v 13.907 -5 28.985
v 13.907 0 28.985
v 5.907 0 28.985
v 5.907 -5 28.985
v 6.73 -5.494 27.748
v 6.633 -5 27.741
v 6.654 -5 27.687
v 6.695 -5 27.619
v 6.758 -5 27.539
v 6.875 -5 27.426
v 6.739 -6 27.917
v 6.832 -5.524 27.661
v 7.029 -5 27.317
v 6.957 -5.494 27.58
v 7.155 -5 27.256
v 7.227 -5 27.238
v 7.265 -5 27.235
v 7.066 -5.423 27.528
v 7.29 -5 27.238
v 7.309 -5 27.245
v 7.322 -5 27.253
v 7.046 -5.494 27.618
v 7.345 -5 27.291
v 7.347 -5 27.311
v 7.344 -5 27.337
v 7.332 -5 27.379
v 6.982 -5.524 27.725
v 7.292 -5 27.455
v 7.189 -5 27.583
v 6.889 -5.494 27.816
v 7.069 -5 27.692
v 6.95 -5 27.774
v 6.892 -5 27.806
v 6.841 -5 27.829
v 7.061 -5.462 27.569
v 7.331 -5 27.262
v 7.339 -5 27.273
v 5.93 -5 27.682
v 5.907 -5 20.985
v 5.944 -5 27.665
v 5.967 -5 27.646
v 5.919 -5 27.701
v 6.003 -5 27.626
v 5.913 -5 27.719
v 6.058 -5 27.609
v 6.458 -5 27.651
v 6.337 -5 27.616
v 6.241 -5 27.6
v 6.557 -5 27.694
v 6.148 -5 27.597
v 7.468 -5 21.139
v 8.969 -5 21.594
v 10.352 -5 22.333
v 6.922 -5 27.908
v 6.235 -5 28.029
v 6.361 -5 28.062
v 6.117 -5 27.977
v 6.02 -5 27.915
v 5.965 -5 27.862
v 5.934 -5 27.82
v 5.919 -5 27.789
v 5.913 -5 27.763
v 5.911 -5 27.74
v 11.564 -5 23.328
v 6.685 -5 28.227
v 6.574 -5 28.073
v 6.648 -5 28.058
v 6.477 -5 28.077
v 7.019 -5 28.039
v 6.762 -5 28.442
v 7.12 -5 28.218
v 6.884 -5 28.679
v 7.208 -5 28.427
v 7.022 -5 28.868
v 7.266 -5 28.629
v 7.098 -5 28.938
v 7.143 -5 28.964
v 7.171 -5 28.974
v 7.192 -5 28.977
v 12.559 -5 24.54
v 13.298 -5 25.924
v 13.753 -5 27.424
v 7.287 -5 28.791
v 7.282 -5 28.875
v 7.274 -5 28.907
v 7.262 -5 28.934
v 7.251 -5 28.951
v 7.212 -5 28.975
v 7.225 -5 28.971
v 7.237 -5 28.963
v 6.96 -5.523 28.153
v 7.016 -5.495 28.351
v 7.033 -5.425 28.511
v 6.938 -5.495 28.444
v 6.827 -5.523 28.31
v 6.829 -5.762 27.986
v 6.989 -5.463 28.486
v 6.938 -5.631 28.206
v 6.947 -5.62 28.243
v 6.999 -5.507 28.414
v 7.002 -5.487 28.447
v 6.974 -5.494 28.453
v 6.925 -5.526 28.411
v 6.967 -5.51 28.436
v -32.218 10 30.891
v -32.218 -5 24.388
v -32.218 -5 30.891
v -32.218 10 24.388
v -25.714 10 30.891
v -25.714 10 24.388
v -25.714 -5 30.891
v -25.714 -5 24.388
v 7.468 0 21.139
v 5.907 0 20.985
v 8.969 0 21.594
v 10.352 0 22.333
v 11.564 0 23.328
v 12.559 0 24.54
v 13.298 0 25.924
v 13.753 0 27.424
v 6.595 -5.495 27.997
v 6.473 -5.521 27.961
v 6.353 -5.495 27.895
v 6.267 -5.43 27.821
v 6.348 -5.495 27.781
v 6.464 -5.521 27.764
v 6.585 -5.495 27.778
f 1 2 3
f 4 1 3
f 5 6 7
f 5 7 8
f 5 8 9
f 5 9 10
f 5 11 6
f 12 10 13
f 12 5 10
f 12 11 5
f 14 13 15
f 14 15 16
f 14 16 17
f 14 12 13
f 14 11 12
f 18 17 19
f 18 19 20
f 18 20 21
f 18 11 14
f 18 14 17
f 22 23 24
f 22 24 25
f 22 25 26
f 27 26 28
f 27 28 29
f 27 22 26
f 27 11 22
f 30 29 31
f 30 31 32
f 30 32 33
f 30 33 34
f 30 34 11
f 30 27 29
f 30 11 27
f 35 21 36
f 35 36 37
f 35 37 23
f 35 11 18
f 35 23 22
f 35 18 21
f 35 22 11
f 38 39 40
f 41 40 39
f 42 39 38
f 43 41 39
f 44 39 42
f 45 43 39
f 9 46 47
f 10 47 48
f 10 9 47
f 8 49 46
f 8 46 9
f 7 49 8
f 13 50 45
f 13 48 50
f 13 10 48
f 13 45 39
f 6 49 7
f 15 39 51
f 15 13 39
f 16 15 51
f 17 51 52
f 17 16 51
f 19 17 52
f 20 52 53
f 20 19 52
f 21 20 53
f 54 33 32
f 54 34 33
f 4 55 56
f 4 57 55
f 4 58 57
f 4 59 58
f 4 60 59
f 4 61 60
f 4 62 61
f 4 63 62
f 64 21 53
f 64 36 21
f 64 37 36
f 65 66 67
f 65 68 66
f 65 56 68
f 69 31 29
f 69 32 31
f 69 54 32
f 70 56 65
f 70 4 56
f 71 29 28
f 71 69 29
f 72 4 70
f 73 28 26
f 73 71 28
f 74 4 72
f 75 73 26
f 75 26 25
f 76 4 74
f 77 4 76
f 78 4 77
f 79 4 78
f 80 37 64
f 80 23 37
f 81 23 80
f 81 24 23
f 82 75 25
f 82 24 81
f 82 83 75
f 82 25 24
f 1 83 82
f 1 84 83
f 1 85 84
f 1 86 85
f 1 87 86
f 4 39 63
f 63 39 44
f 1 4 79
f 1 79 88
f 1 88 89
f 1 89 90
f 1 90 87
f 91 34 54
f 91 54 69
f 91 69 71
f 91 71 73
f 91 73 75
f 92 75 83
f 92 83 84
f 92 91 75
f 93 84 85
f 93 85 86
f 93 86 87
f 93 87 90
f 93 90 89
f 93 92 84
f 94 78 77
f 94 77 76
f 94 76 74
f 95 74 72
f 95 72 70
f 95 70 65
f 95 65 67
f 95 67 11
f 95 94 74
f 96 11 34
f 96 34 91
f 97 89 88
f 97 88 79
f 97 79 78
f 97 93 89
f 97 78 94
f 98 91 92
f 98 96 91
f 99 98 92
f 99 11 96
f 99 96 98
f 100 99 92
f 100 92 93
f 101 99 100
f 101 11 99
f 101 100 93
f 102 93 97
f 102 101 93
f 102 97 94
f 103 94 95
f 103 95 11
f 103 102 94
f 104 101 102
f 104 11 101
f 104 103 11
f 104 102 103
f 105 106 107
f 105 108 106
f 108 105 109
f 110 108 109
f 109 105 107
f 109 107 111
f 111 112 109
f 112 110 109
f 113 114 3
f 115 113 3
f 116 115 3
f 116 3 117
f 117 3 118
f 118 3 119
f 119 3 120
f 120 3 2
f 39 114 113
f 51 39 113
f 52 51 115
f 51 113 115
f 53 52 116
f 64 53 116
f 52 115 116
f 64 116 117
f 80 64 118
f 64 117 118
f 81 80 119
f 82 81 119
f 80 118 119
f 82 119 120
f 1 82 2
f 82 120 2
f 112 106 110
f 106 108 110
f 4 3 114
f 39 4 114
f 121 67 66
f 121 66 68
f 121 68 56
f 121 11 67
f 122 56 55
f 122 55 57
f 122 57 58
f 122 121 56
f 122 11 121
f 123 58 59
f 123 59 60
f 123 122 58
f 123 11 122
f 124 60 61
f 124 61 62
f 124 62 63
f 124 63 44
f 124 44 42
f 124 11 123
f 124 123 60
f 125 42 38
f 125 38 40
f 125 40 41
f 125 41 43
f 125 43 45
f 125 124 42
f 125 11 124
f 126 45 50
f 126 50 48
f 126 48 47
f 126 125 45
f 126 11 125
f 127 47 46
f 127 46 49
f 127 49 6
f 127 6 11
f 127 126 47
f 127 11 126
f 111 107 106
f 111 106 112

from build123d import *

# Parameters (mm, degrees)
F0_W     = 6.5036790227
F0_H     = 6.5036790227
F1_DEPTH = 10
F2_DEPTH = 5


with BuildPart() as f1:
    # F0 (on Front) → F1 (new body)
    with BuildSketch(Plane.XZ):
        with Locations((-28.9659805889, 27.6394066744)):
            Rectangle(F0_W, F0_H)
    extrude(amount=-F1_DEPTH)

    # F0 (on Front) → F2 (join)
    with BuildSketch(Plane.XZ):
        with Locations((-28.9659805889, 27.6394066744)):
            Rectangle(F0_W, F0_H)
    extrude(amount=F2_DEPTH)


with BuildPart() as f2:
    # F0 (on Front) → F2, piece 2 (new body)
    with BuildSketch(Plane.XZ):
        with BuildLine():
            Line((5.907193023, 28.9849955589), (5.907193023, 20.9849955589))
            ThreePointArc((5.907193023, 20.9849955589), (11.5640472725, 23.3281413094), (13.907193023, 28.9849955589))
            Line((13.907193023, 28.9849955589), (5.907193023, 28.9849955589))
        make_face()
    extrude(amount=F2_DEPTH)

    # F6 (on face) → F8 section 0
    with BuildSketch(Plane.XZ.offset(5), mode=Mode.PRIVATE) as f8_s0:
        with BuildLine():
            add(Edge.make_bspline(
                [(6.6479614238, 28.0581297102), (5.9356706234, 28.2826348309), (5.9108519817, 27.748271656), (5.8860333399, 27.213908481), (6.6332192732, 27.7407206239)],
                knots=[3.7677822989, 3.7677822989, 3.7677822989, 6.1181891325, 6.1181891325, 8.4685959662, 8.4685959662, 8.4685959662], degree=2, weights=[1, 0.385355375, 1, 0.385355375, 1]))
            add(Edge.make_bspline(
                [(6.6332192732, 27.7407206239), (6.8248689432, 27.0398889972), (7.3054578977, 27.2432157851), (7.7860468523, 27.446542573), (6.8413803251, 27.8287890608)],
                knots=[0.4819198463, 0.4819198463, 0.4819198463, 2.9528841236, 2.9528841236, 5.4238484009, 5.4238484009, 5.4238484009], degree=2, weights=[1, 0.3290658762, 1, 0.3290658762, 1]))
            add(Edge.make_bspline(
                [(6.8413803251, 27.8287890608), (7.6523704282, 28.4745041463), (7.2509304212, 28.95049957), (6.8494904141, 29.4264949938), (6.6479614238, 28.0581297102)],
                knots=[3.6933529609, 3.6933529609, 3.6933529609, 6.1260689733, 6.1260689733, 8.5587849857, 8.5587849857, 8.5587849857], degree=2, weights=[1, 0.3470636537, 1, 0.3470636537, 1]))
        make_face()
    loft([f8_s0.sketch, Vertex(6.7390613258, -6, 27.9171150178)])


solid = Compound([f1.part, f2.part])
